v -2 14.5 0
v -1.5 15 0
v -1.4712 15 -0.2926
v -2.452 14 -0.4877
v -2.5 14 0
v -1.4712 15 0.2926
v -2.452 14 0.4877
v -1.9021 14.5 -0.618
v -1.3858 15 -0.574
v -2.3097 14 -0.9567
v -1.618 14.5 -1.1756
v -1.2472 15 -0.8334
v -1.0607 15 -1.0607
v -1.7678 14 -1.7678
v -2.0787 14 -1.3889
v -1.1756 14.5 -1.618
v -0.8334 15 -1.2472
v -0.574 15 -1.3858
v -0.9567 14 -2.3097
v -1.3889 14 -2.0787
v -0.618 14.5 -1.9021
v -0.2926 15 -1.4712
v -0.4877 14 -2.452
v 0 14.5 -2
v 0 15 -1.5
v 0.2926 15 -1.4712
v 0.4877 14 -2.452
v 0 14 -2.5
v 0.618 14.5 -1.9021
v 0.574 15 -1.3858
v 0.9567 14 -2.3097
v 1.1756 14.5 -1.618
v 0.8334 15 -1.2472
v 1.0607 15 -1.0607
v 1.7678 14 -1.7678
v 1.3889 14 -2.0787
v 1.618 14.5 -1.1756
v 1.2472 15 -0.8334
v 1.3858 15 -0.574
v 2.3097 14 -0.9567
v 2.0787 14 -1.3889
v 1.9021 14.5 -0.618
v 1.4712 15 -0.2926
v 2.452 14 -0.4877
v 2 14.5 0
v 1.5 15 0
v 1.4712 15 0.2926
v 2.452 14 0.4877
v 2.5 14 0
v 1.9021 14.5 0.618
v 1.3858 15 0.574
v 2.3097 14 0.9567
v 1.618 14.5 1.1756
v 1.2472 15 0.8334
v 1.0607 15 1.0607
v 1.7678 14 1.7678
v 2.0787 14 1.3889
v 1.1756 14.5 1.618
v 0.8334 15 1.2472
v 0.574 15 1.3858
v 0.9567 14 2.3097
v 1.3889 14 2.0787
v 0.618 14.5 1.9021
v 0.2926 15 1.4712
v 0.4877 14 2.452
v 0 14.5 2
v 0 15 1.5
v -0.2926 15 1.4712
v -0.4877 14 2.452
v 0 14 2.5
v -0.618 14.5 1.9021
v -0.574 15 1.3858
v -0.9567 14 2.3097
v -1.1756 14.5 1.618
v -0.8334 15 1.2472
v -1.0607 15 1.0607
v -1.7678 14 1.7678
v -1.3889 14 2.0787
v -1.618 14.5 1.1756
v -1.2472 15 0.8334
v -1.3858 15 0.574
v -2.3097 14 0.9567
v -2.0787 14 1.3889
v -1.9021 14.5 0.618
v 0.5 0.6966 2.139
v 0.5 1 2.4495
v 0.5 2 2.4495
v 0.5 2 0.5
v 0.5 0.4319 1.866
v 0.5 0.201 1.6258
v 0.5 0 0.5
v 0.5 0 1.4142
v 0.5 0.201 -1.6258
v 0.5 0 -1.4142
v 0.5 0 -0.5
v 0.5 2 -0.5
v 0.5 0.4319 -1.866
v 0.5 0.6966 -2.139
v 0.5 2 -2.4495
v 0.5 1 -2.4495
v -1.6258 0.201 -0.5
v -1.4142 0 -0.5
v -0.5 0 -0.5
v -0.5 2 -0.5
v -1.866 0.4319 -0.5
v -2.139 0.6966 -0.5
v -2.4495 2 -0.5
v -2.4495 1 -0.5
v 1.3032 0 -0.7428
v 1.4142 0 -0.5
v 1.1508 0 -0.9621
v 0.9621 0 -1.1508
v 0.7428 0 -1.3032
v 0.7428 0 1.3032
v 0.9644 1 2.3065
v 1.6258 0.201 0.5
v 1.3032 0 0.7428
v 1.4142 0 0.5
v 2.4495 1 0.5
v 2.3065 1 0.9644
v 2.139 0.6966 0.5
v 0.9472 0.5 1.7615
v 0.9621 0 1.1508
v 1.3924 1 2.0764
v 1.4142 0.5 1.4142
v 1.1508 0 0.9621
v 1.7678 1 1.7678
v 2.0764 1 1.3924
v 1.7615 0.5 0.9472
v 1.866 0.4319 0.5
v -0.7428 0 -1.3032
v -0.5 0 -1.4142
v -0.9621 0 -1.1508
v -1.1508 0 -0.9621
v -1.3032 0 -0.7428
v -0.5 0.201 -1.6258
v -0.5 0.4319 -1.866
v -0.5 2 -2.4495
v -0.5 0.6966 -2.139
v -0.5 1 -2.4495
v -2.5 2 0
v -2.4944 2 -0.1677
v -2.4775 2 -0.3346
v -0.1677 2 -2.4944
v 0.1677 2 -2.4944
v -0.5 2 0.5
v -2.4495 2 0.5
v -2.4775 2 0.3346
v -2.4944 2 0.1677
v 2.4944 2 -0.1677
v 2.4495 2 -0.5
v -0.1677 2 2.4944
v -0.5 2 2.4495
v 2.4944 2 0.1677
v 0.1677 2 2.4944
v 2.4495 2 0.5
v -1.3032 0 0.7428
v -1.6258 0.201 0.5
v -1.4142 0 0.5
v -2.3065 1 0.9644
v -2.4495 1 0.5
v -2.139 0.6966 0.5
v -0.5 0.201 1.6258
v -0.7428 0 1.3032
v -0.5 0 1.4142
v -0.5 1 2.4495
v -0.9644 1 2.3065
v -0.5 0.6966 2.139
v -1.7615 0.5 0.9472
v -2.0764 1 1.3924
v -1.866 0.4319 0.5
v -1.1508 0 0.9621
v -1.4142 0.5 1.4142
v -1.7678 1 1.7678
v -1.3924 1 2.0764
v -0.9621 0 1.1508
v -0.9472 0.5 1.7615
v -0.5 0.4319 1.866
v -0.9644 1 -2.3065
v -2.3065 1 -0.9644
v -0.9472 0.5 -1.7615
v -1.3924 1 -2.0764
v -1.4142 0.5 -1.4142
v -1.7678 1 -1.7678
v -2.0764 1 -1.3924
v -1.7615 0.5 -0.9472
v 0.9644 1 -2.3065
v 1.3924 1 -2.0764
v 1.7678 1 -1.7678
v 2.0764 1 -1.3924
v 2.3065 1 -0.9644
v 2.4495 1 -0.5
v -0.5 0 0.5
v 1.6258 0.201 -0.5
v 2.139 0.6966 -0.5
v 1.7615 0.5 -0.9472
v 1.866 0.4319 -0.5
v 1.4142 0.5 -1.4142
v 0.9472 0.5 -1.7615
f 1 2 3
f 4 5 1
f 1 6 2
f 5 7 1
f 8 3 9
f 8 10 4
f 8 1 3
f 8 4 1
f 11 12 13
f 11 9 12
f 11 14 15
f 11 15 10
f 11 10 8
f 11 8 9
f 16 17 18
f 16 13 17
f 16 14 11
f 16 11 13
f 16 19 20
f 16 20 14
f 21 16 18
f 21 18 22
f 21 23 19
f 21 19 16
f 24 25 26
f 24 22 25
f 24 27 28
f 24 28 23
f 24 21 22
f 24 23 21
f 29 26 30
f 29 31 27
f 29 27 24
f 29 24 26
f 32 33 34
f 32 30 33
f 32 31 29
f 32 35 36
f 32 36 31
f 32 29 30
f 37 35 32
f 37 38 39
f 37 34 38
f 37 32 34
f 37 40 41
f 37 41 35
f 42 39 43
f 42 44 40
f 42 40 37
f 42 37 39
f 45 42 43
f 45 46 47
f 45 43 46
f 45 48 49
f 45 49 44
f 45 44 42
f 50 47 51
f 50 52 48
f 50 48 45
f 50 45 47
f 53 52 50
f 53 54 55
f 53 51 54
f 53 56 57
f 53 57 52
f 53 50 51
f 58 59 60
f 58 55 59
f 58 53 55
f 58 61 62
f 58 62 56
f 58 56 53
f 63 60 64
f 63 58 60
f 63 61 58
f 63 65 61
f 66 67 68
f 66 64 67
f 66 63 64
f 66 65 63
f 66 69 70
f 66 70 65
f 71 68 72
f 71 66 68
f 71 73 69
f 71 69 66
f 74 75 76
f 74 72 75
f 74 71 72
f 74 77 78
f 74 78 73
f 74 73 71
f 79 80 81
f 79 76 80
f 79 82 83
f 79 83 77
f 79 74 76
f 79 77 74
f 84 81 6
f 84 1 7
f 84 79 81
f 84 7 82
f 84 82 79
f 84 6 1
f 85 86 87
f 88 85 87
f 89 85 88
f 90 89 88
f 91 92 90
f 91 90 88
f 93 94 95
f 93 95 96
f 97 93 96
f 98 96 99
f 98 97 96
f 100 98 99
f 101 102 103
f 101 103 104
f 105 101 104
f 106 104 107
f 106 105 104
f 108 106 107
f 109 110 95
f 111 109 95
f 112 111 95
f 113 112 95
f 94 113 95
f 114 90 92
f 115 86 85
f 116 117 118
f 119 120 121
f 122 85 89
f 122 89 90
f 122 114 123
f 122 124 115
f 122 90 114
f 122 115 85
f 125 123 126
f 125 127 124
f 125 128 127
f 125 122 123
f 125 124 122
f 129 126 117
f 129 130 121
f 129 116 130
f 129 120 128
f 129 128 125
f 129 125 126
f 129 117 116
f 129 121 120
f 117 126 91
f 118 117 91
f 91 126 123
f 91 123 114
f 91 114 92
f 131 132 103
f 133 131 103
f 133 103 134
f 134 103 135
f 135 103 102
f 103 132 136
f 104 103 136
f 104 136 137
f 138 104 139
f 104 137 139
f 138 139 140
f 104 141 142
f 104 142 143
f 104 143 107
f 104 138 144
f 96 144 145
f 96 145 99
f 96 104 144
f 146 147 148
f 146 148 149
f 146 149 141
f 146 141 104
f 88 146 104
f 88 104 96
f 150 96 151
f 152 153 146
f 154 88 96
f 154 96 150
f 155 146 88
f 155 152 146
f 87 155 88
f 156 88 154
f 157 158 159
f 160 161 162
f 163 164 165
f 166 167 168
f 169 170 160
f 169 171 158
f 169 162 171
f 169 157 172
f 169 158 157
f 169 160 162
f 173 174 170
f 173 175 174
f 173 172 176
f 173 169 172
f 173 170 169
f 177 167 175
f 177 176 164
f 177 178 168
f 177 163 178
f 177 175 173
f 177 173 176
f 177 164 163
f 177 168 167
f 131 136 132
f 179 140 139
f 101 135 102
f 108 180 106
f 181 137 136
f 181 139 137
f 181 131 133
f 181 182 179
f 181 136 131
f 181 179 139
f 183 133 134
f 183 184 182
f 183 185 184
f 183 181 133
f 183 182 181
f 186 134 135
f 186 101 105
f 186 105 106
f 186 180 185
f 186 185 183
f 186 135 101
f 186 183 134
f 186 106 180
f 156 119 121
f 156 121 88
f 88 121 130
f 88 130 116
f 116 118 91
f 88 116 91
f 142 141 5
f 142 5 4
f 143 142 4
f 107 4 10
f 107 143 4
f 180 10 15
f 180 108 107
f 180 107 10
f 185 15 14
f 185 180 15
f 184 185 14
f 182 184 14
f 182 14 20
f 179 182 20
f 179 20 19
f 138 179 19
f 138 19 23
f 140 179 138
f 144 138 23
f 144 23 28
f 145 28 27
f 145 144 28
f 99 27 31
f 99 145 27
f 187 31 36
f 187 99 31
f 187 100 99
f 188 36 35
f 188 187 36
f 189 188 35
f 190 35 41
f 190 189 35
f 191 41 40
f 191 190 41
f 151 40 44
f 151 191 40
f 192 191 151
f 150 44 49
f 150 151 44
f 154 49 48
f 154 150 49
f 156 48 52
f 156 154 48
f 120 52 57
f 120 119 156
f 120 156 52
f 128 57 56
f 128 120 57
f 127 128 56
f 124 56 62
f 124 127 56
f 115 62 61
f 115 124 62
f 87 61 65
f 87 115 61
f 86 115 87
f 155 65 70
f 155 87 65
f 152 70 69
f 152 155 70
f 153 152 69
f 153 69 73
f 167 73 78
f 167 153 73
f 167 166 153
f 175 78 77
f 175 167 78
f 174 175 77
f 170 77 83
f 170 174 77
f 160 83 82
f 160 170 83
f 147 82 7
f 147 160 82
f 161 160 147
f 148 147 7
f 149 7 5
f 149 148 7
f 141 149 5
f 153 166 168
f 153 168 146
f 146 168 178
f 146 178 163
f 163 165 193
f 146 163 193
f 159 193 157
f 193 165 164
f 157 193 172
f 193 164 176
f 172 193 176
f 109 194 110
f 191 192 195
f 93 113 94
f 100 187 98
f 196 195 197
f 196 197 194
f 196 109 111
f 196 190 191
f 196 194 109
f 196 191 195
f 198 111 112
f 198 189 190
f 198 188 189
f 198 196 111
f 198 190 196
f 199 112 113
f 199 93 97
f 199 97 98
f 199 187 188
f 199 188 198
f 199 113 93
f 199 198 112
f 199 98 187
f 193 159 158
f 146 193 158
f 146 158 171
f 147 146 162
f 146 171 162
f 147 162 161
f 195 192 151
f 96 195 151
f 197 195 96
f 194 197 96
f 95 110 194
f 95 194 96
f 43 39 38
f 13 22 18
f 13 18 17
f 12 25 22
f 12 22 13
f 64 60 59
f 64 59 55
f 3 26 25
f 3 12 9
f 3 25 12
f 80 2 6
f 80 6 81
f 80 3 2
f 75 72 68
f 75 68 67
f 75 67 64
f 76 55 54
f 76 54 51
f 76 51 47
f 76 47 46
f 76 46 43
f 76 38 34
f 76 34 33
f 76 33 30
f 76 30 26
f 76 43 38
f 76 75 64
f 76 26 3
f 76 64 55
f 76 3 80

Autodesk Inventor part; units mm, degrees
ref_plane "YZ Plane" through (0, 0, 0) normal (1, 0, 0) x (0, 1, 0)
ref_plane "XZ Plane" through (0, 0, 0) normal (0, 1, 0) x (-1, 0, 0)
ref_plane "XY Plane" through (0, 0, 0) normal (0, 0, 1) x (1, 0, 0)
sketch "Szkic1" plane through (0, 0, 0) normal (0, 1, 0) x (-1, 0, 0)
  circle A0 centre (0, 0) radius 4.25
  line L0 (1.1547, 2) -> (2.3094, 0)
  line L1 (2.3094, 0) -> (1.1547, -2)
  line L2 (1.1547, -2) -> (-1.1547, -2)
  line L3 (-1.1547, -2) -> (-2.3094, 0)
  line L4 (-2.3094, 0) -> (-1.1547, 2)
  line L5 (-1.1547, 2) -> (1.1547, 2)
  circle A1 centre (0, 0) radius 2.5
  dimension "d0" = 8.5
  dimension "d1" = 4
  dimension "d2" = 5
extrude "Wyciągnięcie proste4" add sketch "Szkic1" along normal blind 15 contours L0 L1 L2 L3 L4 L5 | A1
thread "Gwint2" size "M5x0.8" class "6g" standard "ANSI Metric M Profile" full length
chamfer "Faza1" distance 1 angle 45 1 edges at (2.5, 15, 0)
chamfer "Faza2" distance 1 angle 45 1 edges at (2.5, 0, 0)
sketch "Szkic3" plane through (0, 0, 0) normal (0, -1, 0) x (1, 0, 0)
  circle A0 centre (0, 0) radius 2.5 projected
  line L0 (2.5, 0) -> (-2.5, 0) construction
  line L1 (0, 2.5) -> (0, 0.5) construction
  line L2 (0.5, 2.5) -> (0.5, 2.4495) construction
  line L3 (-0.5, 2.5) -> (-0.5, 2.4495) construction
  line L4 (2.5, 0.5) -> (2.4495, 0.5) construction
  line L5 (2.5, -0.5) -> (2.4495, -0.5) construction
  circle A1 centre (0, 0) radius 2.5 construction
  line L6 (2.4495, 0.5) -> (0.5, 0.5)
  line L7 (2.4495, -0.5) -> (0.5, -0.5)
  line L8 (0.5, 2.4495) -> (0.5, 0.5)
  line L9 (-0.5, 2.4495) -> (-0.5, 0.5)
  line L10 (-0.5, 0.5) -> (-0.5, -0.5) construction
  line L11 (0.5, 0.5) -> (0.5, -0.5) construction
  line L12 (0.5, -0.5) -> (-0.5, -0.5) construction
  line L13 (-0.5, -0.5) -> (-0.5, -2.4495)
  line L14 (-2.4495, -0.5) -> (-2.5, -0.5) construction
  line L15 (-2.4495, 0.5) -> (-2.5, 0.5) construction
  line L16 (-0.5, -2.4495) -> (-0.5, -2.5) construction
  line L17 (0.5, -2.4495) -> (0.5, -2.5) construction
  line L18 (0.5, -0.5) -> (0.5, -2.4495)
  line L19 (0.5, 0.5) -> (-0.5, 0.5) construction
  line L20 (0, 0.5) -> (0, -2.5) construction
  line L21 (-0.5, -0.5) -> (-2.4495, -0.5)
  line L22 (-0.5, 0.5) -> (-2.4495, 0.5)
  dimension "d22" = 0.5
  dimension "d23" = 0.5
  dimension "d24" = 0.5
  dimension "d25" = 0.5
extrude "Wyciągnięcie proste5" cut sketch "Szkic3" against normal blind 2 contours A0 L7 L18 L13 L21 L22 L9 L8 L6
properties part number "M5x15" material "Aluminum 6061"
